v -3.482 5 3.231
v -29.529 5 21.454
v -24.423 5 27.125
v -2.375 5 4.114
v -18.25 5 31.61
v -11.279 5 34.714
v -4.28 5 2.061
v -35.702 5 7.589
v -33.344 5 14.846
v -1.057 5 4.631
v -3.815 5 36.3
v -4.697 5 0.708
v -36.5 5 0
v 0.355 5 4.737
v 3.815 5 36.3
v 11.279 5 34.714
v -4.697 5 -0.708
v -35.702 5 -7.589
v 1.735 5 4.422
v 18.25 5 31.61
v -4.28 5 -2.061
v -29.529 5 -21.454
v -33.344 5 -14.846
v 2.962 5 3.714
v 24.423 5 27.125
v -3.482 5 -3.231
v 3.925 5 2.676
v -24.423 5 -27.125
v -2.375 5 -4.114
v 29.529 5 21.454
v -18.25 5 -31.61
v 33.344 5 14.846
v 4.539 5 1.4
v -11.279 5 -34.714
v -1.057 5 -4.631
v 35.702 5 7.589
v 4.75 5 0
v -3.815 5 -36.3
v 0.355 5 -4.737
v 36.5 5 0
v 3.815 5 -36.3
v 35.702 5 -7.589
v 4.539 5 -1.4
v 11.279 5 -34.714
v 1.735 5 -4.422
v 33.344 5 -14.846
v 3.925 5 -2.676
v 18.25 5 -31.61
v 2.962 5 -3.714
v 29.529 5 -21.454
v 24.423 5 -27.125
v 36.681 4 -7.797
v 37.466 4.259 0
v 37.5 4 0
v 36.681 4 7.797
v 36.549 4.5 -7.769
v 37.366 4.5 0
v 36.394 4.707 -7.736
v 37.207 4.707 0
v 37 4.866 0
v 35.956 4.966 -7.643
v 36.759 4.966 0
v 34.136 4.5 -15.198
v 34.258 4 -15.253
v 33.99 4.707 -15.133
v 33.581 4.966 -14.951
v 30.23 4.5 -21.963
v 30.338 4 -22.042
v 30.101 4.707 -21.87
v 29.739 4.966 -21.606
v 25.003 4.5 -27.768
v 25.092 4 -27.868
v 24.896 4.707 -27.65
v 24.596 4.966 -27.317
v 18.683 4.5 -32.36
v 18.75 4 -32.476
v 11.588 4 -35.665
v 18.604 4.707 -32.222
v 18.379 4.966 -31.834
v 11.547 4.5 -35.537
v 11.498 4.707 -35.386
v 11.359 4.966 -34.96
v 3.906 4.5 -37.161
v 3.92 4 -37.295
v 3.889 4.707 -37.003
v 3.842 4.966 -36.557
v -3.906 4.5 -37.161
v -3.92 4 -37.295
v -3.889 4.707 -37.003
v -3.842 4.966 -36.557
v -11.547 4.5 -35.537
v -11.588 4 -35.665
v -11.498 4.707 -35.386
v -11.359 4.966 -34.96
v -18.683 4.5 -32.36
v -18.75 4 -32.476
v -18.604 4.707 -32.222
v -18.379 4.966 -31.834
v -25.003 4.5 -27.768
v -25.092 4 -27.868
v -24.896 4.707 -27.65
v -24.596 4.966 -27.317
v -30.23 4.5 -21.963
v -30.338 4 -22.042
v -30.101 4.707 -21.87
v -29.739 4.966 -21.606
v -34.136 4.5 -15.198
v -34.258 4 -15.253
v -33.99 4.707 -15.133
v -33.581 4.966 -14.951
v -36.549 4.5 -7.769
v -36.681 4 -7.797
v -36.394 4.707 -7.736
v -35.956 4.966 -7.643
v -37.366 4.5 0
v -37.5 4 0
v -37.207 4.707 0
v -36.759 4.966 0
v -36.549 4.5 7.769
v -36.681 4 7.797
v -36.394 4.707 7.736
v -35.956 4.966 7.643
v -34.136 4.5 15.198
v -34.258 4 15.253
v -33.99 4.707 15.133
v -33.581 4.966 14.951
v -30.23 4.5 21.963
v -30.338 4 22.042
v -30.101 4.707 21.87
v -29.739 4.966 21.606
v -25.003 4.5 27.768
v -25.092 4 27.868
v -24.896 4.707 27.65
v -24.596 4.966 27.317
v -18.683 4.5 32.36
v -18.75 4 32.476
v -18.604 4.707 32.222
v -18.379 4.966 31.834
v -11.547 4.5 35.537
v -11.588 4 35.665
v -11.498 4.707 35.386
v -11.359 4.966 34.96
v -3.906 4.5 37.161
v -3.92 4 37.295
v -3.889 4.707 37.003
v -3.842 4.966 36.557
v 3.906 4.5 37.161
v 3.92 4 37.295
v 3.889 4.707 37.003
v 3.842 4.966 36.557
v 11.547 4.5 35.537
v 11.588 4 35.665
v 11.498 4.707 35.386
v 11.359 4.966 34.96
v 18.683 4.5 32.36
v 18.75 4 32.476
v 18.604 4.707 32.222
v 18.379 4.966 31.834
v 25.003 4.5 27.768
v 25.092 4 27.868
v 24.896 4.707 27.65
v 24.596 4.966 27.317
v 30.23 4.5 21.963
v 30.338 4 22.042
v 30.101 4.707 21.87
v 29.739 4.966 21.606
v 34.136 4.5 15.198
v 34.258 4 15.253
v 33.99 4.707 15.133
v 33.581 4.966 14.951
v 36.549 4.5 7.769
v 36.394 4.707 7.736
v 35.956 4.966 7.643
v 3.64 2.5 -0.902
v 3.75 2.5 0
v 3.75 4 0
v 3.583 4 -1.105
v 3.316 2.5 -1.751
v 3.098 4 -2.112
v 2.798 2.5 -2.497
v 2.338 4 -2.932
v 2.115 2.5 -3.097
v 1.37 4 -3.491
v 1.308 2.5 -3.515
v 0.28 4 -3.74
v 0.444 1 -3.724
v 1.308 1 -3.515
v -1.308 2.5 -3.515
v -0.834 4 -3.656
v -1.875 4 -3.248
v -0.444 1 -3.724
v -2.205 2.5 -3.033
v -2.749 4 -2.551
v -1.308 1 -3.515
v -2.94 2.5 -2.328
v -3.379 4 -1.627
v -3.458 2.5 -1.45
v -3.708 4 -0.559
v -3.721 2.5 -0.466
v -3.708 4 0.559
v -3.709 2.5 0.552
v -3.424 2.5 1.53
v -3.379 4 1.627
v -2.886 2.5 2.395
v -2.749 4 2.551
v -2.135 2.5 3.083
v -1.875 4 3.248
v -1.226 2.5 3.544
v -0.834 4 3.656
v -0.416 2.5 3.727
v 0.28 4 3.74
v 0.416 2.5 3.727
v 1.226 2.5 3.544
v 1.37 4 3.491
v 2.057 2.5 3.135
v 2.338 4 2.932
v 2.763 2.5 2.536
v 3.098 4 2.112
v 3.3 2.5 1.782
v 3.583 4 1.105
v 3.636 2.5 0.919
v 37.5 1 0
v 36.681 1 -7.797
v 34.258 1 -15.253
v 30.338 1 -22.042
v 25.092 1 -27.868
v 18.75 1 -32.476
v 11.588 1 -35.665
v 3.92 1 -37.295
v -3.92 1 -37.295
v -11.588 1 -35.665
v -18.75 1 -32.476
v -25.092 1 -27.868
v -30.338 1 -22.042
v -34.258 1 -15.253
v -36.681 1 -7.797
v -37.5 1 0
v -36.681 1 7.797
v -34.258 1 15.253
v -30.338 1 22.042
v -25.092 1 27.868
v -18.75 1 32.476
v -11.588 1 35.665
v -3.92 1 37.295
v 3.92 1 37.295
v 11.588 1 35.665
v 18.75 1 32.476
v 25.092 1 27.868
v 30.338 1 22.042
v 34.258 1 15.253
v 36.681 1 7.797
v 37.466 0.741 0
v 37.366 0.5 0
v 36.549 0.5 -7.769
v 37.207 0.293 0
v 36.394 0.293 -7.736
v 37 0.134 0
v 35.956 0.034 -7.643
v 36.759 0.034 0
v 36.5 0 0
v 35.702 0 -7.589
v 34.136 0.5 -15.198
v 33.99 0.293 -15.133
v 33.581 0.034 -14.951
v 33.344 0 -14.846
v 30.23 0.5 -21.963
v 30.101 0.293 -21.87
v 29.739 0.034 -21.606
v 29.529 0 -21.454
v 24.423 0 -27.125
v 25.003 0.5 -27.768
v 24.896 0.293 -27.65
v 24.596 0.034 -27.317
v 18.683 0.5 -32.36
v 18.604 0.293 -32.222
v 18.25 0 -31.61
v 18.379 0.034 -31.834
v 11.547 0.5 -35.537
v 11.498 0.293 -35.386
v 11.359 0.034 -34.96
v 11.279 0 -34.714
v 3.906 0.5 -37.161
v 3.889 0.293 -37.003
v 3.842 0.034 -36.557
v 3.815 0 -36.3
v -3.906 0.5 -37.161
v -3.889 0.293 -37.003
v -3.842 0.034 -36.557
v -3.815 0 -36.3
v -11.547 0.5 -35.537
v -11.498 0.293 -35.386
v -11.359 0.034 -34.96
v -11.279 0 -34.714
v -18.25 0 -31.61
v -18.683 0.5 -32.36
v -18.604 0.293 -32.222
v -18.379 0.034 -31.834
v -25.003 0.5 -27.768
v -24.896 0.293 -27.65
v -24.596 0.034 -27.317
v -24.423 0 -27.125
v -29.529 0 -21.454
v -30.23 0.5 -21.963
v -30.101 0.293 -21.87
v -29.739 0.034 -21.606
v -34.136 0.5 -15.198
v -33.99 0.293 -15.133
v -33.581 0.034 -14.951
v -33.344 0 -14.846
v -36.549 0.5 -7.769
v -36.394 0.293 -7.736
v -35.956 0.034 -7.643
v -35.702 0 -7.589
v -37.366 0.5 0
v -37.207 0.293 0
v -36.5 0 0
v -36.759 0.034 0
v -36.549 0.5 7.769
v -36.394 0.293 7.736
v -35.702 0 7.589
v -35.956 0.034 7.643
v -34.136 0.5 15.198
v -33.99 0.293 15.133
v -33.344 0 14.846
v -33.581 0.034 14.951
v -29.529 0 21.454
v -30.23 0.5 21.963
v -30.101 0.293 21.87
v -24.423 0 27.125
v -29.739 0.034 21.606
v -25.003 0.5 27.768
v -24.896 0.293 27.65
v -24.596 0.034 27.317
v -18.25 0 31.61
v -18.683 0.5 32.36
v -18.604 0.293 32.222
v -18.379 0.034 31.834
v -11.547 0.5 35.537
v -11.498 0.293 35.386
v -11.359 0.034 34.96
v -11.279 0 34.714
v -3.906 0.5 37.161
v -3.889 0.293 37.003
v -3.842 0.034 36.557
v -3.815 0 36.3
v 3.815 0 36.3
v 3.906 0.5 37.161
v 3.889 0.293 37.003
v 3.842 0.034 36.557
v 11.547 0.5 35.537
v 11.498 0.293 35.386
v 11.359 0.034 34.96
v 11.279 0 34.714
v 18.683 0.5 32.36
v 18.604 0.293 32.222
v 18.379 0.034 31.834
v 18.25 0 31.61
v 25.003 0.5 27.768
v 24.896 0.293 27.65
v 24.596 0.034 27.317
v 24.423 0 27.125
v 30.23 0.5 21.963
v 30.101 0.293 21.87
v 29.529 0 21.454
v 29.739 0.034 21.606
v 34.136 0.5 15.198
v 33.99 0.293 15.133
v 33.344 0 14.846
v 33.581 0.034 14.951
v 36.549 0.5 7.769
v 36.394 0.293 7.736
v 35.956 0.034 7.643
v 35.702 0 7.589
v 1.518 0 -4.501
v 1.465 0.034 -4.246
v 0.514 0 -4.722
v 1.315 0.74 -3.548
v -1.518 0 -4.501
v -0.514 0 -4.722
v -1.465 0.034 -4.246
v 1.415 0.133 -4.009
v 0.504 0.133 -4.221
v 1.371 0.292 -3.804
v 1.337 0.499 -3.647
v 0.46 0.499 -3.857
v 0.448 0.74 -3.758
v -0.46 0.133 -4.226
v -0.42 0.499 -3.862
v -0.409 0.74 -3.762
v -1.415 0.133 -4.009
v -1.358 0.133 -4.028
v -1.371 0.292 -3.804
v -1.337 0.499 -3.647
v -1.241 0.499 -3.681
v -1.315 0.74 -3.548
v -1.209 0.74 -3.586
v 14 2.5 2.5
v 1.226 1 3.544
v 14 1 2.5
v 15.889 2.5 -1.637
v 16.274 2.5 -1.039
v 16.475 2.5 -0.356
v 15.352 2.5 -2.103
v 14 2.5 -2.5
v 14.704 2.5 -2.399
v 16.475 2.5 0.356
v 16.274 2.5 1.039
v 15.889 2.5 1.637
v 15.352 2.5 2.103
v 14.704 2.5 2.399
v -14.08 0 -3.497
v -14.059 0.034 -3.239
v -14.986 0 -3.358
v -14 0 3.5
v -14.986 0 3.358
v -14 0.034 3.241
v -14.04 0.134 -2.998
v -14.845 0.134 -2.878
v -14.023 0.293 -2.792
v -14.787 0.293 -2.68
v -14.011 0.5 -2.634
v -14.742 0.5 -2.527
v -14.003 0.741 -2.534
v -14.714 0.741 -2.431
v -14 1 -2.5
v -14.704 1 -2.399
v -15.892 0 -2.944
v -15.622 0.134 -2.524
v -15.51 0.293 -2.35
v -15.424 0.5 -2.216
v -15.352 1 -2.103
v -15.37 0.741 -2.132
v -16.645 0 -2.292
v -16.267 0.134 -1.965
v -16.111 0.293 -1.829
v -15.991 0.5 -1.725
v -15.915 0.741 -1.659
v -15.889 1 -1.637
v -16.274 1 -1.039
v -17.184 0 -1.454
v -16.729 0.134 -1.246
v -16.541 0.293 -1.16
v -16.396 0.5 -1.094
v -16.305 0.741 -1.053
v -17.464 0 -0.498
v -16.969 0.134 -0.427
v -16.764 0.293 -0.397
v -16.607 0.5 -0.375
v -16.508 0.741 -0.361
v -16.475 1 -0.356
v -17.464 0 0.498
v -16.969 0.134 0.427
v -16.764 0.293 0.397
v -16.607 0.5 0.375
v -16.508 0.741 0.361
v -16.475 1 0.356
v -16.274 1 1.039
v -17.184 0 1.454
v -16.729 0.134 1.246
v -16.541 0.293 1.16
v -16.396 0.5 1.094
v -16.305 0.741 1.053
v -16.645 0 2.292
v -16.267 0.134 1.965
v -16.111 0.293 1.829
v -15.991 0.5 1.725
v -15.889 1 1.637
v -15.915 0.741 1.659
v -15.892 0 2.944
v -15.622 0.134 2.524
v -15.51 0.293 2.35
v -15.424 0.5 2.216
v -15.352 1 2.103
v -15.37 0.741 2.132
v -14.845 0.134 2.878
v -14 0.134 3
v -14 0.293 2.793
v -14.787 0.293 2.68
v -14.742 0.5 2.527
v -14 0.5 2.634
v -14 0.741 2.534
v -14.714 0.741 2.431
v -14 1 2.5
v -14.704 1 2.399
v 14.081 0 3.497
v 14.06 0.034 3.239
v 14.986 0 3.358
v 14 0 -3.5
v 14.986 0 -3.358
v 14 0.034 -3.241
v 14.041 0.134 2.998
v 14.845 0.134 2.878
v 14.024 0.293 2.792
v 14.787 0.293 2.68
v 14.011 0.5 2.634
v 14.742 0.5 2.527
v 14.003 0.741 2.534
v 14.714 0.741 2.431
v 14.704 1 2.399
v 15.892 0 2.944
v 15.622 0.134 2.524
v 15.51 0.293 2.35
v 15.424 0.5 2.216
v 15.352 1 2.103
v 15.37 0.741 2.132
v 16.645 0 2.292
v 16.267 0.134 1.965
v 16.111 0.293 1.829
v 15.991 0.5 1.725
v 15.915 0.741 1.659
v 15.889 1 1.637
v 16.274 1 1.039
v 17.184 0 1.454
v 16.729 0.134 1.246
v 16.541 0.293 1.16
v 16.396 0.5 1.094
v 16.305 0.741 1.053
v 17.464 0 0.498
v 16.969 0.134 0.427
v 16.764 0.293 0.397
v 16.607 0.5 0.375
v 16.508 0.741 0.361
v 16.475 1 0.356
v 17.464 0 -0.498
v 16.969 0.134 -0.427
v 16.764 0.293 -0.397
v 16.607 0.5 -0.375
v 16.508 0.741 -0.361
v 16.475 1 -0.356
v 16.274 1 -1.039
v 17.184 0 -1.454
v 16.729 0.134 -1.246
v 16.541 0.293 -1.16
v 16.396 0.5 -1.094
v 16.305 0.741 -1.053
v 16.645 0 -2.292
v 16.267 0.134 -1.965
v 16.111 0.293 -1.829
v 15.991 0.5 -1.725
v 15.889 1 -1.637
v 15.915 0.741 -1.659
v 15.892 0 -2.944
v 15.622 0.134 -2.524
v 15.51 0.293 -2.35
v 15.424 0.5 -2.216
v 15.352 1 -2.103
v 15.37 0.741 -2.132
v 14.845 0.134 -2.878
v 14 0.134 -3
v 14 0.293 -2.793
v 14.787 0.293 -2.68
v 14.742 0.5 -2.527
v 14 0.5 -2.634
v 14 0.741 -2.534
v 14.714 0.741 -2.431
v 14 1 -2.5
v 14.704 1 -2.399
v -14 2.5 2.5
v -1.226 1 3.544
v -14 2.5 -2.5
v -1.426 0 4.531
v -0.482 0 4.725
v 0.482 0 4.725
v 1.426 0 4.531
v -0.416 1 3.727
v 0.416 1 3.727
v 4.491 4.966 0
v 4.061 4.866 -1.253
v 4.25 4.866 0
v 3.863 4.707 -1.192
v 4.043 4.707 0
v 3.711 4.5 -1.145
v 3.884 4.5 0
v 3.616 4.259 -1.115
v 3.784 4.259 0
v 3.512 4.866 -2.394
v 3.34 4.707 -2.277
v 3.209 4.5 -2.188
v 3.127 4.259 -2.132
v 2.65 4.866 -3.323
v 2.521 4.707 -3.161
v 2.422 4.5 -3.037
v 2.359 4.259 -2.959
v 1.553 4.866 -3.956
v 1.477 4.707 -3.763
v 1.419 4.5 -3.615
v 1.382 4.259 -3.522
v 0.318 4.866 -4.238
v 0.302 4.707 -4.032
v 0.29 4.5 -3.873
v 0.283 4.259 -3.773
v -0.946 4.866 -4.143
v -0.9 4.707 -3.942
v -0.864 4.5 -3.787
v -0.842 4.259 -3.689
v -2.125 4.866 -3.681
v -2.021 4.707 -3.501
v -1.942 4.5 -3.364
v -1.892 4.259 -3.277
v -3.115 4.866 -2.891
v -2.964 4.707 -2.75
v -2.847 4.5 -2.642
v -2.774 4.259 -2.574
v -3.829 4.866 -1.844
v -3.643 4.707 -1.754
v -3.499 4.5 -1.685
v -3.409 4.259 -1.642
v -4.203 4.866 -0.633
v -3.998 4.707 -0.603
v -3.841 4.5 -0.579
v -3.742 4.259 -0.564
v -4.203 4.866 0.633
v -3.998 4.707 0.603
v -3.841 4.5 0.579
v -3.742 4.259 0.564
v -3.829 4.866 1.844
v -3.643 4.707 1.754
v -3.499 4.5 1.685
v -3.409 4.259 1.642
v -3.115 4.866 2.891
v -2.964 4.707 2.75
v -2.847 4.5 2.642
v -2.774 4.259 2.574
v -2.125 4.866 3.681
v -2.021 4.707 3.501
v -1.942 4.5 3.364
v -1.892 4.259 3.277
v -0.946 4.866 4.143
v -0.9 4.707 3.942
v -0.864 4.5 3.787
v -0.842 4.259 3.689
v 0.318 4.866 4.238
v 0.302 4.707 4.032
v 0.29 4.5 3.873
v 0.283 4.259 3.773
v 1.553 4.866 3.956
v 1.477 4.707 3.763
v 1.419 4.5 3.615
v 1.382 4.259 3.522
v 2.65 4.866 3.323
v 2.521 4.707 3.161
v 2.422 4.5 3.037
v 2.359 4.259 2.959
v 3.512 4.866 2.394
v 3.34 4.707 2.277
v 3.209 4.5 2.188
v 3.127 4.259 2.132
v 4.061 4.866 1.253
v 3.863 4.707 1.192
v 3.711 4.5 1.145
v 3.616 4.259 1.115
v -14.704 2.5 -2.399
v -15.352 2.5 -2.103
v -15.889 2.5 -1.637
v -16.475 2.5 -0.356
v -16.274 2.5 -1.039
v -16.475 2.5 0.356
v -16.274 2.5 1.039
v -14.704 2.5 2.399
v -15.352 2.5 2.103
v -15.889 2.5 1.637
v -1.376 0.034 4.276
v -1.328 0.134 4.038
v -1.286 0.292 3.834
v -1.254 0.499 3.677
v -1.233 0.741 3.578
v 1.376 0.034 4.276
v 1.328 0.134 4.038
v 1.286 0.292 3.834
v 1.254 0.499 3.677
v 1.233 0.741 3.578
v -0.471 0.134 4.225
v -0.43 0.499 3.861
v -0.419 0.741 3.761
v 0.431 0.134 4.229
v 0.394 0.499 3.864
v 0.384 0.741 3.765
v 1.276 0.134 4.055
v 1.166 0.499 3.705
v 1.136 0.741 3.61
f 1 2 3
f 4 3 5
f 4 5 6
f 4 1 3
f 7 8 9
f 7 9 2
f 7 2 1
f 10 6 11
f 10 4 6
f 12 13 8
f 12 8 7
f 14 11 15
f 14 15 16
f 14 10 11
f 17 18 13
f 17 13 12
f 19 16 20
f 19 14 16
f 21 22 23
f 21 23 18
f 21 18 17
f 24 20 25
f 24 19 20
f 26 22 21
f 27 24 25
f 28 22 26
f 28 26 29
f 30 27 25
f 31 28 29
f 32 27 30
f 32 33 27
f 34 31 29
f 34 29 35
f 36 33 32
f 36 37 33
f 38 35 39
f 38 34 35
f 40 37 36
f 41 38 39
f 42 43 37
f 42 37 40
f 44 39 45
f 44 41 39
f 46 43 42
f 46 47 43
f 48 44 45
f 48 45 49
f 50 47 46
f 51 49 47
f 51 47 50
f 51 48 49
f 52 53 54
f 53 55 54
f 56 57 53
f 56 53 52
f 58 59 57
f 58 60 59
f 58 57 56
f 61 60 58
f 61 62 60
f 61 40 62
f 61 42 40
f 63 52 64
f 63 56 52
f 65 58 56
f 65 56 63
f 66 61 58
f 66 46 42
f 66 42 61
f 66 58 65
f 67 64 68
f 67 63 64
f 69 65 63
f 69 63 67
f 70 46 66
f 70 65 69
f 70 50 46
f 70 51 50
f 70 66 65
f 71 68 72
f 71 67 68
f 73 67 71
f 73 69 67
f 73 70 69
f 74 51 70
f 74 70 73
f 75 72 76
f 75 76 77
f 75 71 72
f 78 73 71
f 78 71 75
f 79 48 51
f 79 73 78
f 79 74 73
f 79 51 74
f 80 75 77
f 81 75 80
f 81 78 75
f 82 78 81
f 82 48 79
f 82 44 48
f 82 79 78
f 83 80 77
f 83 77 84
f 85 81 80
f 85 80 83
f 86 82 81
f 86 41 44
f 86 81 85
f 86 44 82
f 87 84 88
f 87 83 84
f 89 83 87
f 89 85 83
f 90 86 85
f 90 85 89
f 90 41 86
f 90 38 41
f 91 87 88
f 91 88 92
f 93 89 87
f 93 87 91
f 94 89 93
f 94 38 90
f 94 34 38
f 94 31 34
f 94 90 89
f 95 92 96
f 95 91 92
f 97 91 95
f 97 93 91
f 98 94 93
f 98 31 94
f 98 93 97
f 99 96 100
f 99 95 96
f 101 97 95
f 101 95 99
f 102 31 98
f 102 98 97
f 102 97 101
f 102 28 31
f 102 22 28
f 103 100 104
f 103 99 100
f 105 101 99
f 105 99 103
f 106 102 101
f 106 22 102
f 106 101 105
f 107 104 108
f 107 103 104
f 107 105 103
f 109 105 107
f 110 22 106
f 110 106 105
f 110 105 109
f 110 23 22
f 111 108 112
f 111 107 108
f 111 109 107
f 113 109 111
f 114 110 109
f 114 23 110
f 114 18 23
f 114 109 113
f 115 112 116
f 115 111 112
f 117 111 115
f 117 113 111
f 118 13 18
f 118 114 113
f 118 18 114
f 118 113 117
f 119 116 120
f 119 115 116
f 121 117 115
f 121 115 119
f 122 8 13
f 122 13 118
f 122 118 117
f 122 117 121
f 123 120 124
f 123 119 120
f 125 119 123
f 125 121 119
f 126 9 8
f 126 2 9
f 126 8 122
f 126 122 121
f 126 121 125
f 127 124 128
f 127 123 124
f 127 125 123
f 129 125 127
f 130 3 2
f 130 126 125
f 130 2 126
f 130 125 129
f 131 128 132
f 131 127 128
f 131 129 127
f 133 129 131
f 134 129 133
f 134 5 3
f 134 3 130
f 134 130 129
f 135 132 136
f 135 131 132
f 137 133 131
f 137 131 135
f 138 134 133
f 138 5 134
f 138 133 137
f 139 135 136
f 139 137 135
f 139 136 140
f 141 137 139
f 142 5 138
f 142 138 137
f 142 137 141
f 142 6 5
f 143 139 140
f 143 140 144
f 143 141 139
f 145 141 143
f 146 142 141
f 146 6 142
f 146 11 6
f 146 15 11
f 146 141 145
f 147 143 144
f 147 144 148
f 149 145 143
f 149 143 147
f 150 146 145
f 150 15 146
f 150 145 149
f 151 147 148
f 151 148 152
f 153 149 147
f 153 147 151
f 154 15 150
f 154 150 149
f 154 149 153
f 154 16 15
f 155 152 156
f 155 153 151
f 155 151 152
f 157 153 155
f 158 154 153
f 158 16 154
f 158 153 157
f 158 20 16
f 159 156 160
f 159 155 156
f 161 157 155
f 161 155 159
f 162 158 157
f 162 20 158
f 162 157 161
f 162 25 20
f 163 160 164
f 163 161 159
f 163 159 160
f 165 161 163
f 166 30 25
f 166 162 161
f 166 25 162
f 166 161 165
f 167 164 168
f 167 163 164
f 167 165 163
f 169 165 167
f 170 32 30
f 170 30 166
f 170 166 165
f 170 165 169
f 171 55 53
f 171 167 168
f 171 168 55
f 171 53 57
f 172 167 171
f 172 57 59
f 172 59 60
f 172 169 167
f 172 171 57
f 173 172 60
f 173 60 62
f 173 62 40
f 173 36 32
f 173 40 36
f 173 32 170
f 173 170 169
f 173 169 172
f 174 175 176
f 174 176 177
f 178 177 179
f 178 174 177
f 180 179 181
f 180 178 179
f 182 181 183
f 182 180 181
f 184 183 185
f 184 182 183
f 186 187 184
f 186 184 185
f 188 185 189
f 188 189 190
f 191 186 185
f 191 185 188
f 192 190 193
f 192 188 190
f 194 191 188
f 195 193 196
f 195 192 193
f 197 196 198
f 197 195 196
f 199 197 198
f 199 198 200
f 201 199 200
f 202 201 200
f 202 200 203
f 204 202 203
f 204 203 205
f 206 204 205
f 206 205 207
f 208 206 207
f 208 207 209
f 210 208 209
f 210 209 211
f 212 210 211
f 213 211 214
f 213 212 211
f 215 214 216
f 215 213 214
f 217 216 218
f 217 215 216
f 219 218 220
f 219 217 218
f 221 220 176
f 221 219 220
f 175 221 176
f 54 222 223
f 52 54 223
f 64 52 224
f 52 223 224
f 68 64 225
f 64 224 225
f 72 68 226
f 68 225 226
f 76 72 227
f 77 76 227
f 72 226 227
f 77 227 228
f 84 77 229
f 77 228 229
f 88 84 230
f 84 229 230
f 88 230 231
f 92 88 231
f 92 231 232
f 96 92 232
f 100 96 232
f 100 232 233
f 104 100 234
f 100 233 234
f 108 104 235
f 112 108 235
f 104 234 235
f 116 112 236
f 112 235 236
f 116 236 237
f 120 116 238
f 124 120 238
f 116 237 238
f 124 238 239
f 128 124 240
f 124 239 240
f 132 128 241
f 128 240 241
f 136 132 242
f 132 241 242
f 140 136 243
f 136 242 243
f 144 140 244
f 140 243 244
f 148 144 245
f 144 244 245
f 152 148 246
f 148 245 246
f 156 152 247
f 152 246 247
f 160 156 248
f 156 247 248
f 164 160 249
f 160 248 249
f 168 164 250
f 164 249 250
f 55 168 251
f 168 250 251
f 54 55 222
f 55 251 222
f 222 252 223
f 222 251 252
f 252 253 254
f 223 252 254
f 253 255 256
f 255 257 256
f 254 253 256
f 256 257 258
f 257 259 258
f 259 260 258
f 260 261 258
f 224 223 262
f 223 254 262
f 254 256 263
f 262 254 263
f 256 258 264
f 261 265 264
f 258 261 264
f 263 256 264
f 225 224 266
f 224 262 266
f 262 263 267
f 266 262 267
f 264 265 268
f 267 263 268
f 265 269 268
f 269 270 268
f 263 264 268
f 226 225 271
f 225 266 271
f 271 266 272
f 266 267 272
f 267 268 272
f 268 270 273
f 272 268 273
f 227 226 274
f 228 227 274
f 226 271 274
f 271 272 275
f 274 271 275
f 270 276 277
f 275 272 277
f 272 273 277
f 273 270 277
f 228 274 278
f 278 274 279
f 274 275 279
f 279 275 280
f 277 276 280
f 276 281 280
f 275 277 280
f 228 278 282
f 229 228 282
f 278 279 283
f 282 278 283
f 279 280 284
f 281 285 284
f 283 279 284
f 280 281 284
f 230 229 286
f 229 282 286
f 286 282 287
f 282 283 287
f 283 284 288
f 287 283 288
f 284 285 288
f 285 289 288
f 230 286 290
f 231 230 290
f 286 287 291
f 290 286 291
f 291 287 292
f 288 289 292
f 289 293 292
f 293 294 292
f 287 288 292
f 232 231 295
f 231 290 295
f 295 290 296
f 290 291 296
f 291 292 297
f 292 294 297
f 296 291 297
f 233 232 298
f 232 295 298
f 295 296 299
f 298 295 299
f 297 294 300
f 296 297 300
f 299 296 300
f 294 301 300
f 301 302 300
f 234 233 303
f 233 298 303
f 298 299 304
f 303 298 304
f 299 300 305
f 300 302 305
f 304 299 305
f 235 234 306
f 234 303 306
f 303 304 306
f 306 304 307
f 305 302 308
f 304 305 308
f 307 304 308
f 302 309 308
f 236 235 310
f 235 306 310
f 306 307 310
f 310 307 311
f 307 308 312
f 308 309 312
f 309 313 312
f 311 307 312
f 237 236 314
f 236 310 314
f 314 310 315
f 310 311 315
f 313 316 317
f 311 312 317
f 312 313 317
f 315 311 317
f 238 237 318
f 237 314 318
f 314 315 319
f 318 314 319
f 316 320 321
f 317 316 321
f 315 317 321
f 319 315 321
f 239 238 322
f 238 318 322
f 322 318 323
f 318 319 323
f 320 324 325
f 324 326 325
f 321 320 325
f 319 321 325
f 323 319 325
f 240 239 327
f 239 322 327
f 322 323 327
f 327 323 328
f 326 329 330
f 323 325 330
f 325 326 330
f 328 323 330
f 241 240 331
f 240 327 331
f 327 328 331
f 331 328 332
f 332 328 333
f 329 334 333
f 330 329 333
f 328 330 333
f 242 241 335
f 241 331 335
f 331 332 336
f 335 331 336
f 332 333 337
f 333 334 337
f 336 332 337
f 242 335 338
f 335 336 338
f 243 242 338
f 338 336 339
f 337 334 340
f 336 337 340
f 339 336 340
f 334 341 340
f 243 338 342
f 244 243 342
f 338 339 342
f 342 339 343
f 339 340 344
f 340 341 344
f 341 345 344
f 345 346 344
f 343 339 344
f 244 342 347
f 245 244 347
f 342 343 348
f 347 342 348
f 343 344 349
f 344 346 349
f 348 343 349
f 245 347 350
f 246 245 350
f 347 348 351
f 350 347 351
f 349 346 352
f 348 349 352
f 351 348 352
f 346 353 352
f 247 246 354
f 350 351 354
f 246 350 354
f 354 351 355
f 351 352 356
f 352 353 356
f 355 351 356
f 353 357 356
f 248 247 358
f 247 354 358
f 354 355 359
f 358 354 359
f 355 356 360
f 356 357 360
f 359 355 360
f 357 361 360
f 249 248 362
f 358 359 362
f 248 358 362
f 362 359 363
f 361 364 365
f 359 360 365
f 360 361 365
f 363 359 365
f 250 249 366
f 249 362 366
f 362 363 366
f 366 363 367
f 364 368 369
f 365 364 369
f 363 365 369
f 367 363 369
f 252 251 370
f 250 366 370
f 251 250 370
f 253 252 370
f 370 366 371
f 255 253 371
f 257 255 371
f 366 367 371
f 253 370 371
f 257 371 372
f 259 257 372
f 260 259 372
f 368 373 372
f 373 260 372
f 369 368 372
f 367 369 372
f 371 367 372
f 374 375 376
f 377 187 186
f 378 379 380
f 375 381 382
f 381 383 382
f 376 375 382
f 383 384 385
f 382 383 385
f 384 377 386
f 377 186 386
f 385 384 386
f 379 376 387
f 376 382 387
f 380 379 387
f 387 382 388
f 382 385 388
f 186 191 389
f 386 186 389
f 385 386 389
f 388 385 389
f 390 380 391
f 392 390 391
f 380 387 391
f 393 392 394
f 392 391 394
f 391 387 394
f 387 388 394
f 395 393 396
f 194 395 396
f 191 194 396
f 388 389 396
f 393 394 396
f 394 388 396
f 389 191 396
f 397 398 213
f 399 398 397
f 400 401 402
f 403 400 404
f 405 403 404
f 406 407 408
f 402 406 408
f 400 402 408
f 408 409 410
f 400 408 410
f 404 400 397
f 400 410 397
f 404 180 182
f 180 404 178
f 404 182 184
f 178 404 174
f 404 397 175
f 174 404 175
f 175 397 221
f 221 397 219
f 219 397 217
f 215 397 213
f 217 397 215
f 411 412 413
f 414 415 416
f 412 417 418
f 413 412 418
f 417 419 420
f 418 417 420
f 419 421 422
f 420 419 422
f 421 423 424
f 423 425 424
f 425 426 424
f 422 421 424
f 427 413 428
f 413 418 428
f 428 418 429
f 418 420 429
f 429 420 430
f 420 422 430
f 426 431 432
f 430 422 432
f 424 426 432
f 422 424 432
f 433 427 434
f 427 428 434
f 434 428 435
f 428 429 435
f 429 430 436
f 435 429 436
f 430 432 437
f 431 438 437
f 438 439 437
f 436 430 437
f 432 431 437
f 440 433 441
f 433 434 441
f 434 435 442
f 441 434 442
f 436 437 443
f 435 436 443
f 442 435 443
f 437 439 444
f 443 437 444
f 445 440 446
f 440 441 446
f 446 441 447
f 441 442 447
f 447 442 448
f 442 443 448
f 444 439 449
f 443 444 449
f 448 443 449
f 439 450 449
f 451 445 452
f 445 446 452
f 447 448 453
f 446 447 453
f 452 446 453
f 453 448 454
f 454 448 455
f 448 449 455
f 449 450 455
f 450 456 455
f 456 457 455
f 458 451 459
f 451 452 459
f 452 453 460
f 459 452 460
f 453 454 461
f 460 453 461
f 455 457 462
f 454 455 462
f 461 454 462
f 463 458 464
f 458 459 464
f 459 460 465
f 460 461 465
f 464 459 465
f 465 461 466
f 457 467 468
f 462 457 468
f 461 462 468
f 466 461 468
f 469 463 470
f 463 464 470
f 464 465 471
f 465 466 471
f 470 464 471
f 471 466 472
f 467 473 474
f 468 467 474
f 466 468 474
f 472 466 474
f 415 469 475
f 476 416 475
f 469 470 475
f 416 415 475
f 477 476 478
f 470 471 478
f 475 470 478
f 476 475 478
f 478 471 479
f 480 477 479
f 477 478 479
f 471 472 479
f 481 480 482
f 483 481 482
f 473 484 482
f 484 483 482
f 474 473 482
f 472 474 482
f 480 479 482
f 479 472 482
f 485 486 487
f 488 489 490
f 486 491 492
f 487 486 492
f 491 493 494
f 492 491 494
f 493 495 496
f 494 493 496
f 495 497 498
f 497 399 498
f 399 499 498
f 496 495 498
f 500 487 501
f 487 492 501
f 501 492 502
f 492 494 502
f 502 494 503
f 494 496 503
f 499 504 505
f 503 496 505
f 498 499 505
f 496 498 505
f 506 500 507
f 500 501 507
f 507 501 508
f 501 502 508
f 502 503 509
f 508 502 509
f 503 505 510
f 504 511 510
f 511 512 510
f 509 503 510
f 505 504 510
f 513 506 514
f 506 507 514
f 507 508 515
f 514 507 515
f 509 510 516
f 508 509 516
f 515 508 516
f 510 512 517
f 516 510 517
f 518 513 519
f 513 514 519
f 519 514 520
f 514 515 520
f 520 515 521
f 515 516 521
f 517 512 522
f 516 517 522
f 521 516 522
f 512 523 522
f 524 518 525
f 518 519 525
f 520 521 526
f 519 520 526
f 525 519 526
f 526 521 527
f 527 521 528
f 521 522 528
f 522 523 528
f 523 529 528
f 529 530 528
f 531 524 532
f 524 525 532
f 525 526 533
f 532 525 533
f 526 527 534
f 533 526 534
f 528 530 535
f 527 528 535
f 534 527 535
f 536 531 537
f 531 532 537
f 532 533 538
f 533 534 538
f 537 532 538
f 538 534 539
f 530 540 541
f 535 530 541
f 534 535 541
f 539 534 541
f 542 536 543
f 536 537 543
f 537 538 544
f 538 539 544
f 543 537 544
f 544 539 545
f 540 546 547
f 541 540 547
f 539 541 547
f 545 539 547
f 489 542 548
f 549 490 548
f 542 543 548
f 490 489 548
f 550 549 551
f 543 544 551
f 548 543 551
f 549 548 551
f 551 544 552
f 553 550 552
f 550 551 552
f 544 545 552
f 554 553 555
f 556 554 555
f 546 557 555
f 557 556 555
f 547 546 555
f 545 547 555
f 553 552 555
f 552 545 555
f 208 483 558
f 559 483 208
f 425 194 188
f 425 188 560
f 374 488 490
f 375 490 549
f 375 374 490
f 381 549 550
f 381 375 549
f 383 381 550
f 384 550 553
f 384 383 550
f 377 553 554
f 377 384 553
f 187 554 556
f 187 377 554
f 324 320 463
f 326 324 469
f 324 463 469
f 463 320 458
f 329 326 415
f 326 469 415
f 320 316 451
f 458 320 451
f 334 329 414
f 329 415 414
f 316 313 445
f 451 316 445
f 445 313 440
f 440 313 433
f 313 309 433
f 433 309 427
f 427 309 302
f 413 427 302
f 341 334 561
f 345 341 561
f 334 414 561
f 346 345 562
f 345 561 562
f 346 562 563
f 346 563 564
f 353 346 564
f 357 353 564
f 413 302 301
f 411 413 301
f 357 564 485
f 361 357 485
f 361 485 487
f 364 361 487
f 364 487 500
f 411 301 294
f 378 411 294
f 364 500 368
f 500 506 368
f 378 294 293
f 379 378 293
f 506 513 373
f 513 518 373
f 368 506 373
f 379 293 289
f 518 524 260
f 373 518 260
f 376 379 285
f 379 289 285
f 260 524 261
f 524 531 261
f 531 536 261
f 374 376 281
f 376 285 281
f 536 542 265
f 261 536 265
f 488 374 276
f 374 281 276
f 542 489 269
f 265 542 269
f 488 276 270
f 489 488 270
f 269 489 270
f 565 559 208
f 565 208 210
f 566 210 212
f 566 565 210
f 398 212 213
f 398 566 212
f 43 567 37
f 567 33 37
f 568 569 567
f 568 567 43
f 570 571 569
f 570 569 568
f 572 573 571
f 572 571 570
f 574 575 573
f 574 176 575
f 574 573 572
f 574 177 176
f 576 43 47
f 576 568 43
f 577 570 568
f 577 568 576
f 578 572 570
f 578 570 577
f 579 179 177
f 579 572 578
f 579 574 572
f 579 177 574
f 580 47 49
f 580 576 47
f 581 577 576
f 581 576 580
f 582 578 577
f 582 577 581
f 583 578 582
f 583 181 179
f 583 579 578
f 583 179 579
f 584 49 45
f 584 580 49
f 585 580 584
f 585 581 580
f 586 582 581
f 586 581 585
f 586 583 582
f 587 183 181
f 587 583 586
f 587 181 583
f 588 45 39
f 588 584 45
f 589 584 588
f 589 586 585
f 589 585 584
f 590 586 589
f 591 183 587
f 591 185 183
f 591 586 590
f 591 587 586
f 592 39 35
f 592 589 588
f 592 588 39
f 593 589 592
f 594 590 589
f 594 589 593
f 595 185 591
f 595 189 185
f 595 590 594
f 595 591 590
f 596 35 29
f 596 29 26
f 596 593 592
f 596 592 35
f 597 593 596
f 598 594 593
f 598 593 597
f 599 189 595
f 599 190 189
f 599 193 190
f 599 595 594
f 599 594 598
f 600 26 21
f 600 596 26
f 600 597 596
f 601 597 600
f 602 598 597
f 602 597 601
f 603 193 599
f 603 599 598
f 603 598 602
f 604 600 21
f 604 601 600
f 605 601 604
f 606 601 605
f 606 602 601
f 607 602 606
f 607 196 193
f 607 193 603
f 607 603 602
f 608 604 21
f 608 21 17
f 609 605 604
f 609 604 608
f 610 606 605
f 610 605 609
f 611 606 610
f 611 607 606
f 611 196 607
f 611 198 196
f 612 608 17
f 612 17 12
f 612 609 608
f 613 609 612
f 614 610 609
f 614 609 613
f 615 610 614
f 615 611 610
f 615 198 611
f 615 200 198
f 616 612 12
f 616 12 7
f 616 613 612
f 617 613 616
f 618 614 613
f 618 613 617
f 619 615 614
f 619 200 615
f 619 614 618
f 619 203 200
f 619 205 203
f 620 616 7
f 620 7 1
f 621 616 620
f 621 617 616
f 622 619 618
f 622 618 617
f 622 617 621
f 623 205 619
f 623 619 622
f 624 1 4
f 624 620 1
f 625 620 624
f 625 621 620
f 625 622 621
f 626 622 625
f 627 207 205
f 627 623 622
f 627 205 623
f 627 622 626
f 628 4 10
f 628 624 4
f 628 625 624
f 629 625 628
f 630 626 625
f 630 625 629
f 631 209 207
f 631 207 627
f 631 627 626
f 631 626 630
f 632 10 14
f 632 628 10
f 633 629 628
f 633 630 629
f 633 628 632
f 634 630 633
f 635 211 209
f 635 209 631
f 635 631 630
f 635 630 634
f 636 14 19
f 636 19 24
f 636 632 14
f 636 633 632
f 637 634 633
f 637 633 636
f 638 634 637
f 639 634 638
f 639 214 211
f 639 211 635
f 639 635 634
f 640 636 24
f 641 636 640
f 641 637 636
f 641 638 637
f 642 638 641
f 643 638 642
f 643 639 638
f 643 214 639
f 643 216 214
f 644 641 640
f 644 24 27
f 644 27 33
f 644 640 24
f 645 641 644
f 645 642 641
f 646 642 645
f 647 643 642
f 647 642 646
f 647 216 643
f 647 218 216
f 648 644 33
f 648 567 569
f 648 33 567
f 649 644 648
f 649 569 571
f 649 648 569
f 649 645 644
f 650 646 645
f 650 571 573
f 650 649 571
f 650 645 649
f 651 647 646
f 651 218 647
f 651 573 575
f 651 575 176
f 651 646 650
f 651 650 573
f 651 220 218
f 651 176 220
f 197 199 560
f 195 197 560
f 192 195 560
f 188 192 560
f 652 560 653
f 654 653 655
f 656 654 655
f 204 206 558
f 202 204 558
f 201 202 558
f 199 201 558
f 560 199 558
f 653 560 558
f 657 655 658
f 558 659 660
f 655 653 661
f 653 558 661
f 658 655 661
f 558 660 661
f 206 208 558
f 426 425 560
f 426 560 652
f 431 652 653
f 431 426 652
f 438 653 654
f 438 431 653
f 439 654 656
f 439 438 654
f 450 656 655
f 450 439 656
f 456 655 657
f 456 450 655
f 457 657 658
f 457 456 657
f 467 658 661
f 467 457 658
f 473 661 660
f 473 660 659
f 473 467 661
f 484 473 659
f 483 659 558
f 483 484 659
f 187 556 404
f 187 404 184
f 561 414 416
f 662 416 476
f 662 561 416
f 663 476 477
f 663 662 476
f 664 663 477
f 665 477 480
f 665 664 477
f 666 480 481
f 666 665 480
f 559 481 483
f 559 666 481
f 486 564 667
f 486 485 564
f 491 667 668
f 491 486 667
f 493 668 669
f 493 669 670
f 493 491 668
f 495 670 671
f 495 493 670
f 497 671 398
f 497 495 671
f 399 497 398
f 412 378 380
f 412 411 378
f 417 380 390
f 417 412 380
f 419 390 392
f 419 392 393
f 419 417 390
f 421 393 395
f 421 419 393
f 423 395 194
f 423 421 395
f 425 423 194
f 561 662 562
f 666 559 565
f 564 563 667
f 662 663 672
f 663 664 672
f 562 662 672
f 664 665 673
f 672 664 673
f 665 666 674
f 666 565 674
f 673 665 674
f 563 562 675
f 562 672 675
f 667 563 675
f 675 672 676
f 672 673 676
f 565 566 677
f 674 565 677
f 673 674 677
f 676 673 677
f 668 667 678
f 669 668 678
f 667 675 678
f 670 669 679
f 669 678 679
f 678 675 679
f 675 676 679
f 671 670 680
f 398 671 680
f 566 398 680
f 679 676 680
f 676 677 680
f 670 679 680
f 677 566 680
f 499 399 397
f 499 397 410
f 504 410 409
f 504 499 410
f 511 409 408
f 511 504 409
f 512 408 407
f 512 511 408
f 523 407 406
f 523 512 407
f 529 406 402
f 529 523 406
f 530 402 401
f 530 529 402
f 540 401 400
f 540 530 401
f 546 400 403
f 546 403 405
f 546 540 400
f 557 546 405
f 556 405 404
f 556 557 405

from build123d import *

# Parameters (mm, degrees)
SKETCH1_R           = 37.5
SKETCH1_R_2         = 3.75
BOSS_EXTRUDE1_DEPTH = 5
CUT_EXTRUDE1_DEPTH  = 2.5
FILLET1_R           = 1


with BuildPart() as part:
    # Sketch1 → Boss-Extrude1 (new body)
    with BuildSketch(Plane(origin=(0, 0, 0), x_dir=(1, 0, 0), z_dir=(0, 1, 0))):
        Circle(SKETCH1_R)
        Circle(SKETCH1_R_2, mode=Mode.SUBTRACT)
    extrude(amount=BOSS_EXTRUDE1_DEPTH)

    # Sketch2 → Cut-Extrude1 (cut)
    with BuildSketch(Plane.XZ):
        with BuildLine():
            Line((-14, 2.5), (-1.226116774, 3.543887365))
            ThreePointArc((-1.226116774, 3.543887365), (0, 3.75), (1.226116774, 3.543887365))
            Line((1.226116774, 3.543887365), (14, 2.5))
            ThreePointArc((14, 2.5), (16.5, 0), (14, -2.5))
            Line((14, -2.5), (1.307857892, -3.514542322))
            ThreePointArc((1.307857892, -3.514542322), (0, -3.75), (-1.307857892, -3.514542322))
            Line((-1.307857892, -3.514542322), (-14, -2.5))
            ThreePointArc((-14, -2.5), (-16.5, 0), (-14, 2.5))
        make_face()
    extrude(amount=-CUT_EXTRUDE1_DEPTH, mode=Mode.SUBTRACT)

    # Fillet1
    fillet1_edges = [part.edges().sort_by_distance(p)[0] for p in [
        (0, 0, 3.75),
        (7.653928946, 0, -3.007271161),
        (16.5, 0, 0),
        (-37.5, 0, 0),
        (7.613058387, 0, 3.021943683),
        (-7.613058387, 0, 3.021943683),
        (-16.5, 0, 0),
        (-7.653928946, 0, -3.007271161),
        (-37.5, 5, 0),
        (-3.75, 5, 0),
        (0, 0, -3.75),
    ]]
    fillet(fillet1_edges, radius=FILLET1_R)


solid = part.part
